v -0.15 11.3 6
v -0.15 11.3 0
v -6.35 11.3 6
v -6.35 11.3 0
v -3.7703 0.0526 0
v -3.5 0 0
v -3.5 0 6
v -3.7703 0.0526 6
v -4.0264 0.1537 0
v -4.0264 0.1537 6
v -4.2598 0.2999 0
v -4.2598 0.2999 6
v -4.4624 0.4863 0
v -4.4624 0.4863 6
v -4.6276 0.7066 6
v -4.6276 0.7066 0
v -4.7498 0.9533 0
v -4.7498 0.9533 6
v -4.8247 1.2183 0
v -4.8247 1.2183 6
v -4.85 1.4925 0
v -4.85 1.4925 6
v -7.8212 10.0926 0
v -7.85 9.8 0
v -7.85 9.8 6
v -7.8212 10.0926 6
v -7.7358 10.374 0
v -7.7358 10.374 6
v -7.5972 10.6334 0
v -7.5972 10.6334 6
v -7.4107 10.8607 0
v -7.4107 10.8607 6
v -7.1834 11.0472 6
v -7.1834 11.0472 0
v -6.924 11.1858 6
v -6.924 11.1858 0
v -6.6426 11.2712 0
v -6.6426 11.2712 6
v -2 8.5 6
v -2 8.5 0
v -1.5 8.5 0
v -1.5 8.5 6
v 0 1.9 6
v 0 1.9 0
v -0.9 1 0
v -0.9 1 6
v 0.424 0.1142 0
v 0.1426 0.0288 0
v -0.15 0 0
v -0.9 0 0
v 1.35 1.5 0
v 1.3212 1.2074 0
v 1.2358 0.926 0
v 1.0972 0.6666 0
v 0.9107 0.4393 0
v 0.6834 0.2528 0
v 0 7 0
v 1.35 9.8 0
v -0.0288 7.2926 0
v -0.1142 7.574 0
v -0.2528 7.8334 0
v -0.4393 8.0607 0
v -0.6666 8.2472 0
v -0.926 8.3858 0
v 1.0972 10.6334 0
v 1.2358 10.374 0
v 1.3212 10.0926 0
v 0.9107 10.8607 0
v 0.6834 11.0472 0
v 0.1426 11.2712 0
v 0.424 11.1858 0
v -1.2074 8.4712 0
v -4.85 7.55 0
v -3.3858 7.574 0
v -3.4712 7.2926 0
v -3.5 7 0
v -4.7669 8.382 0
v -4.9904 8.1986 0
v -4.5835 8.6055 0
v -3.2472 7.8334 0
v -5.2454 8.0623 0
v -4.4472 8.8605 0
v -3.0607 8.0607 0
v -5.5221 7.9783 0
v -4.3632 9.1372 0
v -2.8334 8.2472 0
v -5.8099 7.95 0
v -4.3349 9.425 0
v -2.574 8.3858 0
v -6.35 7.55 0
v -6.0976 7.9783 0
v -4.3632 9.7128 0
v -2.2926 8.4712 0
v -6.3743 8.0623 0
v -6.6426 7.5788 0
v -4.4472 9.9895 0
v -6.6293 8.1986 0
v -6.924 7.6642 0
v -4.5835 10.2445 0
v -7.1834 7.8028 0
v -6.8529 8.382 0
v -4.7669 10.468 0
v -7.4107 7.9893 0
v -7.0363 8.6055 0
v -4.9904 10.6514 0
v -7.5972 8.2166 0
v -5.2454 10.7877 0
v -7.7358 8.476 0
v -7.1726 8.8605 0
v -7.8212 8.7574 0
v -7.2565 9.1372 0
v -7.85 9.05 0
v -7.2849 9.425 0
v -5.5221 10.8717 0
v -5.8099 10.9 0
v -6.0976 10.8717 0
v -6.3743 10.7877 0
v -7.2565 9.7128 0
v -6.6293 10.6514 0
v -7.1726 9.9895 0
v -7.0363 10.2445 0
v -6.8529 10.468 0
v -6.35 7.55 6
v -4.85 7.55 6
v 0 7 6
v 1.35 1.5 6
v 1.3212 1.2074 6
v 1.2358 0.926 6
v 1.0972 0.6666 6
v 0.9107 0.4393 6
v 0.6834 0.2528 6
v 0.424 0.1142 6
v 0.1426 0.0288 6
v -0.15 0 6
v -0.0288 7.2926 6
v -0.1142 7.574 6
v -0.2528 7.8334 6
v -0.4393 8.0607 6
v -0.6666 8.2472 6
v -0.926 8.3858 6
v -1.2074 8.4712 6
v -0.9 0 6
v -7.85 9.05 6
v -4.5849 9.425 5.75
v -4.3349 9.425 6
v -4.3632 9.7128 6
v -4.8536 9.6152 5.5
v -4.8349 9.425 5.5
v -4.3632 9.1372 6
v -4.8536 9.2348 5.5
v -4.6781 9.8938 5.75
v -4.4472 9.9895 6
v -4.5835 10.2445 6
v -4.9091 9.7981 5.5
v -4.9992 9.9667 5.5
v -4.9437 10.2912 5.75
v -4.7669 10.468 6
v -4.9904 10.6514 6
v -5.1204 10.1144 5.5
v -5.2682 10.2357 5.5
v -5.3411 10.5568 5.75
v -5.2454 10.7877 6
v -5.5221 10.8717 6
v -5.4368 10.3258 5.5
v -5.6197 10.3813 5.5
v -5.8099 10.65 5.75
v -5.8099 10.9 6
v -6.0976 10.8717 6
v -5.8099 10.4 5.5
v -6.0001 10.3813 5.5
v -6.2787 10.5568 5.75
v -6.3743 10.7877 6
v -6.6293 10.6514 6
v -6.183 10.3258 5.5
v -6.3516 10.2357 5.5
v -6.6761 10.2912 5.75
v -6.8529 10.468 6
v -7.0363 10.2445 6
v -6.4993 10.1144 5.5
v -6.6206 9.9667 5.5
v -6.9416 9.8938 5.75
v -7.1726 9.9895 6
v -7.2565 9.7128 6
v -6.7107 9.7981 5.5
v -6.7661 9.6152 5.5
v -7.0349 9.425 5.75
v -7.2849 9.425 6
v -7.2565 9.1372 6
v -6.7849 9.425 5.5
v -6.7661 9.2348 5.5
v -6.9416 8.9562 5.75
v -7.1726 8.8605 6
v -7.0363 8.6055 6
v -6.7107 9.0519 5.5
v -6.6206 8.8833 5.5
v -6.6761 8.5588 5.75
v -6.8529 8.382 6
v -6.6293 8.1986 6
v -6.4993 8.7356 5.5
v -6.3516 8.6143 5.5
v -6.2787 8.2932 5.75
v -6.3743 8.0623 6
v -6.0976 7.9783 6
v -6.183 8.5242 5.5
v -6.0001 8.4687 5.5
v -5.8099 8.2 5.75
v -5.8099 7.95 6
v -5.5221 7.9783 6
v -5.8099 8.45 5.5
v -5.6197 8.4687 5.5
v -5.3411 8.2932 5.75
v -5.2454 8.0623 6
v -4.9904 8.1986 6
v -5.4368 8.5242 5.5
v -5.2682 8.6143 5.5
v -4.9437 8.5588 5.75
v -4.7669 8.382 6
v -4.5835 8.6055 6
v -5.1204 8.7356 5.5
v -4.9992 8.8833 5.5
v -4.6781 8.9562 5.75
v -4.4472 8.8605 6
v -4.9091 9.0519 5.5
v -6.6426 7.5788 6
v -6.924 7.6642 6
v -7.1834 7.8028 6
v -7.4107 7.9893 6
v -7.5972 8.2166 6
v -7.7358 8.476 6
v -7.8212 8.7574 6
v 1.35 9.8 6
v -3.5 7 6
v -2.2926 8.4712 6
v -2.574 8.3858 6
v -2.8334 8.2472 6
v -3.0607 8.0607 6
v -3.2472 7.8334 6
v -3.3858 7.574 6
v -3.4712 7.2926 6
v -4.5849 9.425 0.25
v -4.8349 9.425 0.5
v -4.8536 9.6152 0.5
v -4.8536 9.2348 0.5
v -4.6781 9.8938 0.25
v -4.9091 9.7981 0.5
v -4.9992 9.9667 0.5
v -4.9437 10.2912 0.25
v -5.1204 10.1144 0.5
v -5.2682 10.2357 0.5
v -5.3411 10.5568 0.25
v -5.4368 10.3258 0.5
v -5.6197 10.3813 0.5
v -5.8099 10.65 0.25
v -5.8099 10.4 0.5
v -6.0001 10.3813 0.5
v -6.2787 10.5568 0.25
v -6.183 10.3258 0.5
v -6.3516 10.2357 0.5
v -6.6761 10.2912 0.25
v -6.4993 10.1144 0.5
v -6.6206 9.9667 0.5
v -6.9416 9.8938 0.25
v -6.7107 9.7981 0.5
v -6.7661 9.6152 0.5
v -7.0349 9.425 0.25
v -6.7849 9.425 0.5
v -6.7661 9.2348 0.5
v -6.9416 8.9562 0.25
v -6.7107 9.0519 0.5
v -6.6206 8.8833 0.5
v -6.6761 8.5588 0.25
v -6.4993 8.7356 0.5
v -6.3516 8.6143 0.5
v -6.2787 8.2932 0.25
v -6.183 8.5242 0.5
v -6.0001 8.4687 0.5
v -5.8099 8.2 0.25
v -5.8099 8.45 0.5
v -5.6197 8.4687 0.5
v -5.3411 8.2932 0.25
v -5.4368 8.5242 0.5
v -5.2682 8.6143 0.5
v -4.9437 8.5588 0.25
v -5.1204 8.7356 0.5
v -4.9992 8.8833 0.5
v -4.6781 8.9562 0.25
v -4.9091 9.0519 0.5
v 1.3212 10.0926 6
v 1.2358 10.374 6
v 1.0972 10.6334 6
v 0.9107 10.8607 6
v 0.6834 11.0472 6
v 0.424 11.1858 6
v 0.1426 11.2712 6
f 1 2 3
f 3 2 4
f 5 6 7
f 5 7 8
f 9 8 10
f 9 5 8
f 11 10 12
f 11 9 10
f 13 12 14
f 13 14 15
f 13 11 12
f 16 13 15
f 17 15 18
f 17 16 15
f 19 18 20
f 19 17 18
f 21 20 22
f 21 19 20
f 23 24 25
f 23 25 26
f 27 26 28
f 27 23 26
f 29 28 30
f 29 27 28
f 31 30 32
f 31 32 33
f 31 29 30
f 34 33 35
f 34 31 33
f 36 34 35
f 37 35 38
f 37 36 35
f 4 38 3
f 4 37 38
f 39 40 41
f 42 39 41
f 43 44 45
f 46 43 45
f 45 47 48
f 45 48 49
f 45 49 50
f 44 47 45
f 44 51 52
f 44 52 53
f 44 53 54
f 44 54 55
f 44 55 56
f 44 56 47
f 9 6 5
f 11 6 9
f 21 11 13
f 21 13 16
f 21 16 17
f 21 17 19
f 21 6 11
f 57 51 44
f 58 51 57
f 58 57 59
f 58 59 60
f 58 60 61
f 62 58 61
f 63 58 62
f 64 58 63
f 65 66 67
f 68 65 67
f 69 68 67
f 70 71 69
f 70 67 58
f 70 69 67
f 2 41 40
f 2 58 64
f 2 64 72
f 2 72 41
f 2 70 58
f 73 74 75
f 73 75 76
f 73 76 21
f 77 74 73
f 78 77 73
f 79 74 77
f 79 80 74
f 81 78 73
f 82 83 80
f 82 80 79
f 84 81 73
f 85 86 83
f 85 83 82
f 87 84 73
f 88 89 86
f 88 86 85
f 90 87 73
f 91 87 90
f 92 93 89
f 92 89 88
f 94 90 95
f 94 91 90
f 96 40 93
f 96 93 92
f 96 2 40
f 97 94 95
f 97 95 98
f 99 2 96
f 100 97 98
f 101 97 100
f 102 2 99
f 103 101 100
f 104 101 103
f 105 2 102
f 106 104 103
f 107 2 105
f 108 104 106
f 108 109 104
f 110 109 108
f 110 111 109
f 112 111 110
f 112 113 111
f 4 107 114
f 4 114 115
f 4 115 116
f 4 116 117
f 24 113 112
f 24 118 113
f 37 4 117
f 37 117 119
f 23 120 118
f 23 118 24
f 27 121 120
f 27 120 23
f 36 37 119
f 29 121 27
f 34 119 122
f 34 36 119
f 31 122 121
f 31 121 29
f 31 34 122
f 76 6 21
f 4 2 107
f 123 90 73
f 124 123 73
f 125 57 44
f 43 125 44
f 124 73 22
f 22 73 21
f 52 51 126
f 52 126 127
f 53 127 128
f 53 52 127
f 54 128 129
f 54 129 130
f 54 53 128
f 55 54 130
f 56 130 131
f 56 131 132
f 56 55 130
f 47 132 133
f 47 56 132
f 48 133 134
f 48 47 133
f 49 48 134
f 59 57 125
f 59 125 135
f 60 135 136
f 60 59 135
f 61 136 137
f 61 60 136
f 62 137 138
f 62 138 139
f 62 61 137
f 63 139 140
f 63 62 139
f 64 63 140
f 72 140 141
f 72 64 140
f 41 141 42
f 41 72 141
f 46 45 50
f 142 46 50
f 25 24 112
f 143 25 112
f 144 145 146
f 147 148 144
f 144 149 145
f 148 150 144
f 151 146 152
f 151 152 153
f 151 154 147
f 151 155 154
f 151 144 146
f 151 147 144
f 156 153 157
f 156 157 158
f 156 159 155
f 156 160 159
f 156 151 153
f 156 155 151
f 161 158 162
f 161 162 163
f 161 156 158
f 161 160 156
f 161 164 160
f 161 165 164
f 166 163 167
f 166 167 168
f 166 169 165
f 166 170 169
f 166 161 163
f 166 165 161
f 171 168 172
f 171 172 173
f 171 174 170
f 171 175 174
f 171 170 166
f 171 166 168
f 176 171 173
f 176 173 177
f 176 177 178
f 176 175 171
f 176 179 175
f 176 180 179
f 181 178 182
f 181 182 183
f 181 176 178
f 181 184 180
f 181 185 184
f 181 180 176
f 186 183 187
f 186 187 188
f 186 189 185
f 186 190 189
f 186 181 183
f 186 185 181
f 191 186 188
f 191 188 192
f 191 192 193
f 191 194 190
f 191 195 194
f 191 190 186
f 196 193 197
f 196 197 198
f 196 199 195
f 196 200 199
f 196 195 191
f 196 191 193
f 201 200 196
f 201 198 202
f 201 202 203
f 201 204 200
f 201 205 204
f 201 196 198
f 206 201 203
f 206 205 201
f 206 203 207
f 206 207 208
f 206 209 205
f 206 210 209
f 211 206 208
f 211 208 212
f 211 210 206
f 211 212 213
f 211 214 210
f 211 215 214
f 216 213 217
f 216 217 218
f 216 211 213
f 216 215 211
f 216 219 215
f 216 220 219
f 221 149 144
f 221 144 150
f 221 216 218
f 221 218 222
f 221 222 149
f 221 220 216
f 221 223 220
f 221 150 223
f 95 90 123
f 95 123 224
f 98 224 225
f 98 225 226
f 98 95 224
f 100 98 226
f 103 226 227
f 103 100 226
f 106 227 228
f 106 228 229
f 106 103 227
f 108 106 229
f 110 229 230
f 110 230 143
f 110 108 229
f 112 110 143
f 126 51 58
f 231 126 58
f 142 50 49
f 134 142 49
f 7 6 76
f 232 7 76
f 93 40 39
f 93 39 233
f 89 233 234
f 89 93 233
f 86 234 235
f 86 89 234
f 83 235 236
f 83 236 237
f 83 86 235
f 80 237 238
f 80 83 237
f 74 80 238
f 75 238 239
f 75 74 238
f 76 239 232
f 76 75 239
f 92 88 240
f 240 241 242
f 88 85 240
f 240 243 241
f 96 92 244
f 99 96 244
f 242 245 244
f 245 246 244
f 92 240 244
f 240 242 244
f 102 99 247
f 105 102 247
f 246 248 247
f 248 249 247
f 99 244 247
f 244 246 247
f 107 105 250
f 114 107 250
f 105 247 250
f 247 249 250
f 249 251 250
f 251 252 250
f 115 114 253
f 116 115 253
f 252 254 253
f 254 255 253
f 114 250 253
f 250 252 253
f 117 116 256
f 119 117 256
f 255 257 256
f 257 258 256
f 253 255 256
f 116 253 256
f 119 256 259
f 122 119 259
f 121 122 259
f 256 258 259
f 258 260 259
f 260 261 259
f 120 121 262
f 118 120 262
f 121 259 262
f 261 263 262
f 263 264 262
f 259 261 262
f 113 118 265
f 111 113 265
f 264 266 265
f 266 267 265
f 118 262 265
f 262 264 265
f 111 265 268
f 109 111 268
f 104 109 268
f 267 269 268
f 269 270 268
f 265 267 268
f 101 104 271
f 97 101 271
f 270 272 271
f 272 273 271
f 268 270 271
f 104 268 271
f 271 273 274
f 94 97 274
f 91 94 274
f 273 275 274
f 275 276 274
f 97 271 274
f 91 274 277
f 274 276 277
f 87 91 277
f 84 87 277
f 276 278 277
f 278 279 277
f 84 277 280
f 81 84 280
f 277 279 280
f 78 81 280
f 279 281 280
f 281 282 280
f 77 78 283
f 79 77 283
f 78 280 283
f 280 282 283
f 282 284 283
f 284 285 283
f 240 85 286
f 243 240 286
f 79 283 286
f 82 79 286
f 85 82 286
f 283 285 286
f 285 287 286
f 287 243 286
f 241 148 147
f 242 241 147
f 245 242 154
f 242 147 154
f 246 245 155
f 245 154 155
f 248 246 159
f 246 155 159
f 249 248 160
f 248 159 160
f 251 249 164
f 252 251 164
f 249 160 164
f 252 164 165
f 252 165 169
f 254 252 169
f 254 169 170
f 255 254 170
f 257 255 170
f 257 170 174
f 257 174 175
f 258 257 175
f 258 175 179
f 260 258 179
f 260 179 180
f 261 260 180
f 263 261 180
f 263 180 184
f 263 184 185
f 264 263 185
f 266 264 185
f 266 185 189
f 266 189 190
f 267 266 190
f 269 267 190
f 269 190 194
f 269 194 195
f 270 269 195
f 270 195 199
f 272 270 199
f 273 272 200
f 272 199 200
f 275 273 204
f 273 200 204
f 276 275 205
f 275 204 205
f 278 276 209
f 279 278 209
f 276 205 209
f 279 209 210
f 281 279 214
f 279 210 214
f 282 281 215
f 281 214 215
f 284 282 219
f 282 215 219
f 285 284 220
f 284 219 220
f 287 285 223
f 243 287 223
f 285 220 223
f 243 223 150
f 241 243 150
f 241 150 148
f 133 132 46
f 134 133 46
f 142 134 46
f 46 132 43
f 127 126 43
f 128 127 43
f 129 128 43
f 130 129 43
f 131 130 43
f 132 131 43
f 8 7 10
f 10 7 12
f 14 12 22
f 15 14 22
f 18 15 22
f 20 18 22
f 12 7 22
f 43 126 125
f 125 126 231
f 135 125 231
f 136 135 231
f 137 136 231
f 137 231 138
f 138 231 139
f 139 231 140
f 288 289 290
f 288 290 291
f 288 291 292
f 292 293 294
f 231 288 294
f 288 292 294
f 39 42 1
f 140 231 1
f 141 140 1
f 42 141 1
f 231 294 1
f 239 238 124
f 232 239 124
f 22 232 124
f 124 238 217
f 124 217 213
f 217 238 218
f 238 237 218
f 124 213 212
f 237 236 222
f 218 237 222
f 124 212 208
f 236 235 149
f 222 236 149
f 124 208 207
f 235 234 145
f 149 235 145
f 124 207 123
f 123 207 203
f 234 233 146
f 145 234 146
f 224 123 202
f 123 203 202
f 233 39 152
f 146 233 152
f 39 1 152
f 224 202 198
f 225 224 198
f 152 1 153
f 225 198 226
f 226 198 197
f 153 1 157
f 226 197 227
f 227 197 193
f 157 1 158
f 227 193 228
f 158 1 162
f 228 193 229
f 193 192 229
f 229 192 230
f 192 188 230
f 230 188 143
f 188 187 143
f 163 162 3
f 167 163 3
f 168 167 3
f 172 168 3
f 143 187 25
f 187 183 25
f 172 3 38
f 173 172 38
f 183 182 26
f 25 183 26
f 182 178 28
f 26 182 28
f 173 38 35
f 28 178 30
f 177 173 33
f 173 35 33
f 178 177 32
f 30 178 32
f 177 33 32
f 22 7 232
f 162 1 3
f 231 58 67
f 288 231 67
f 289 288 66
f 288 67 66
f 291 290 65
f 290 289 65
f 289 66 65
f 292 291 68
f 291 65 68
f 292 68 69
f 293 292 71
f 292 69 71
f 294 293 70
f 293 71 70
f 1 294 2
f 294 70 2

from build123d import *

# Parameters (mm, degrees)
F1_DEPTH     = 6
F2_R         = 0.975
F3_DEPTH     = 6.001
F4_T1_DEPTH  = 6
F4_T3_DEPTH  = 6
F4_T5_DEPTH  = 13.5
F4_T7_DEPTH  = 13.5
F4_T9_DEPTH  = 13.5
F4_T11_DEPTH = 13.5
F4_T13_DEPTH = 13.4624057783
F5_SIZE      = 0.5


# Not quite as in the source:
# - a fillet or chamfer that OpenCascade refuses, or shapes differently, is made with other operations: its cross-section is extruded or revolved along the edge and cut away or added


with BuildPart() as f1:
    # F0 (on Top) → F1 (new body)
    with BuildSketch(Plane.XY):
        Polygon((0, 1.9), (0, 0), (1.35, 0), (1.35, 11.3), (-7.85, 11.3), (-7.85, 7.55), (-4.85, 7.55), (-4.85, 0), (-3.5, 0), (-3.5, 8.5), (0, 8.5), align=None)
        Polygon((-0.9, 0), (0, 0), (0, 1.9), (-0.9, 1), align=None)
    extrude(amount=F1_DEPTH)

    # F2 (on face) → F3 (cut, through all)
    with BuildSketch(Plane.XY.offset(6)):
        with Locations((-5.8098790534, 9.425)):
            Circle(F2_R)
    extrude(amount=-F3_DEPTH, mode=Mode.SUBTRACT)

    # F4: fillet of radius 1.5 on 7 edges, made by hand

    # F4_s2 → F4_t1 (join)
    with BuildSketch(Plane.XY):
        with BuildLine():
            ThreePointArc((0, 7), (-0.4393398282, 8.0606601718), (-1.5, 8.5))
            Line((-1.5, 8.5), (0, 8.5))
            Line((0, 8.5), (0, 7))
        make_face()
    extrude(amount=F4_T1_DEPTH)

    # F4_s4 → F4_t3 (join)
    with BuildSketch(Plane.XY):
        with BuildLine():
            ThreePointArc((-2, 8.5), (-3.0606601718, 8.0606601718), (-3.5, 7))
            Line((-3.5, 7), (-3.5, 8.5))
            Line((-3.5, 8.5), (-2, 8.5))
        make_face()
    extrude(amount=F4_T3_DEPTH)

    # F4_s6 → F4_t5 (cut)
    with BuildSketch(Plane.XY.offset(-3.75)):
        with BuildLine():
            ThreePointArc((1.35, 1.5), (0.9106601718, 0.4393398282), (-0.15, 0))
            Line((-0.15, 0), (1.35, 0))
            Line((1.35, 0), (1.35, 1.5))
        make_face()
    extrude(amount=F4_T5_DEPTH, mode=Mode.SUBTRACT)

    # F4_s8 → F4_t7 (cut)
    with BuildSketch(Plane.XY.offset(-3.75)):
        with BuildLine():
            ThreePointArc((1.35, 9.8), (0.9106601718, 10.8606601718), (-0.15, 11.3))
            Line((-0.15, 11.3), (1.35, 11.3))
            Line((1.35, 11.3), (1.35, 9.8))
        make_face()
    extrude(amount=F4_T7_DEPTH, mode=Mode.SUBTRACT)

    # F4_s10 → F4_t9 (cut)
    with BuildSketch(Plane.XY.offset(-3.75)):
        with BuildLine():
            ThreePointArc((-7.85, 9.8), (-7.4106601718, 10.8606601718), (-6.35, 11.3))
            Line((-6.35, 11.3), (-7.85, 11.3))
            Line((-7.85, 11.3), (-7.85, 9.8))
        make_face()
    extrude(amount=F4_T9_DEPTH, mode=Mode.SUBTRACT)

    # F4_s12 → F4_t11 (cut)
    with BuildSketch(Plane.XY.offset(-3.75)):
        with BuildLine():
            ThreePointArc((-6.35, 7.55), (-7.4106601718, 7.9893398282), (-7.85, 9.05))
            Line((-7.85, 9.05), (-7.85, 7.55))
            Line((-7.85, 7.55), (-6.35, 7.55))
        make_face()
    extrude(amount=F4_T11_DEPTH, mode=Mode.SUBTRACT)

    # F4_s14 → F4_t13 (cut)
    with BuildSketch(Plane.XY.offset(-3.7312028891)):
        with BuildLine():
            ThreePointArc((-3.5, 0), (-4.4624297731, 0.4862505658), (-4.85, 1.4924811557))
            Line((-4.85, 1.4924811557), (-4.85, 0))
            Line((-4.85, 0), (-3.5, 0))
        make_face()
    extrude(amount=F4_T13_DEPTH, mode=Mode.SUBTRACT)

    # F5
    f5_edges = [f1.edges().sort_by_distance(p)[0] for p in [
        (-6.784879, 9.425, 6),
        (-6.784879, 9.425, 0),
    ]]
    chamfer(f5_edges, length=F5_SIZE)


solid = f1.part
